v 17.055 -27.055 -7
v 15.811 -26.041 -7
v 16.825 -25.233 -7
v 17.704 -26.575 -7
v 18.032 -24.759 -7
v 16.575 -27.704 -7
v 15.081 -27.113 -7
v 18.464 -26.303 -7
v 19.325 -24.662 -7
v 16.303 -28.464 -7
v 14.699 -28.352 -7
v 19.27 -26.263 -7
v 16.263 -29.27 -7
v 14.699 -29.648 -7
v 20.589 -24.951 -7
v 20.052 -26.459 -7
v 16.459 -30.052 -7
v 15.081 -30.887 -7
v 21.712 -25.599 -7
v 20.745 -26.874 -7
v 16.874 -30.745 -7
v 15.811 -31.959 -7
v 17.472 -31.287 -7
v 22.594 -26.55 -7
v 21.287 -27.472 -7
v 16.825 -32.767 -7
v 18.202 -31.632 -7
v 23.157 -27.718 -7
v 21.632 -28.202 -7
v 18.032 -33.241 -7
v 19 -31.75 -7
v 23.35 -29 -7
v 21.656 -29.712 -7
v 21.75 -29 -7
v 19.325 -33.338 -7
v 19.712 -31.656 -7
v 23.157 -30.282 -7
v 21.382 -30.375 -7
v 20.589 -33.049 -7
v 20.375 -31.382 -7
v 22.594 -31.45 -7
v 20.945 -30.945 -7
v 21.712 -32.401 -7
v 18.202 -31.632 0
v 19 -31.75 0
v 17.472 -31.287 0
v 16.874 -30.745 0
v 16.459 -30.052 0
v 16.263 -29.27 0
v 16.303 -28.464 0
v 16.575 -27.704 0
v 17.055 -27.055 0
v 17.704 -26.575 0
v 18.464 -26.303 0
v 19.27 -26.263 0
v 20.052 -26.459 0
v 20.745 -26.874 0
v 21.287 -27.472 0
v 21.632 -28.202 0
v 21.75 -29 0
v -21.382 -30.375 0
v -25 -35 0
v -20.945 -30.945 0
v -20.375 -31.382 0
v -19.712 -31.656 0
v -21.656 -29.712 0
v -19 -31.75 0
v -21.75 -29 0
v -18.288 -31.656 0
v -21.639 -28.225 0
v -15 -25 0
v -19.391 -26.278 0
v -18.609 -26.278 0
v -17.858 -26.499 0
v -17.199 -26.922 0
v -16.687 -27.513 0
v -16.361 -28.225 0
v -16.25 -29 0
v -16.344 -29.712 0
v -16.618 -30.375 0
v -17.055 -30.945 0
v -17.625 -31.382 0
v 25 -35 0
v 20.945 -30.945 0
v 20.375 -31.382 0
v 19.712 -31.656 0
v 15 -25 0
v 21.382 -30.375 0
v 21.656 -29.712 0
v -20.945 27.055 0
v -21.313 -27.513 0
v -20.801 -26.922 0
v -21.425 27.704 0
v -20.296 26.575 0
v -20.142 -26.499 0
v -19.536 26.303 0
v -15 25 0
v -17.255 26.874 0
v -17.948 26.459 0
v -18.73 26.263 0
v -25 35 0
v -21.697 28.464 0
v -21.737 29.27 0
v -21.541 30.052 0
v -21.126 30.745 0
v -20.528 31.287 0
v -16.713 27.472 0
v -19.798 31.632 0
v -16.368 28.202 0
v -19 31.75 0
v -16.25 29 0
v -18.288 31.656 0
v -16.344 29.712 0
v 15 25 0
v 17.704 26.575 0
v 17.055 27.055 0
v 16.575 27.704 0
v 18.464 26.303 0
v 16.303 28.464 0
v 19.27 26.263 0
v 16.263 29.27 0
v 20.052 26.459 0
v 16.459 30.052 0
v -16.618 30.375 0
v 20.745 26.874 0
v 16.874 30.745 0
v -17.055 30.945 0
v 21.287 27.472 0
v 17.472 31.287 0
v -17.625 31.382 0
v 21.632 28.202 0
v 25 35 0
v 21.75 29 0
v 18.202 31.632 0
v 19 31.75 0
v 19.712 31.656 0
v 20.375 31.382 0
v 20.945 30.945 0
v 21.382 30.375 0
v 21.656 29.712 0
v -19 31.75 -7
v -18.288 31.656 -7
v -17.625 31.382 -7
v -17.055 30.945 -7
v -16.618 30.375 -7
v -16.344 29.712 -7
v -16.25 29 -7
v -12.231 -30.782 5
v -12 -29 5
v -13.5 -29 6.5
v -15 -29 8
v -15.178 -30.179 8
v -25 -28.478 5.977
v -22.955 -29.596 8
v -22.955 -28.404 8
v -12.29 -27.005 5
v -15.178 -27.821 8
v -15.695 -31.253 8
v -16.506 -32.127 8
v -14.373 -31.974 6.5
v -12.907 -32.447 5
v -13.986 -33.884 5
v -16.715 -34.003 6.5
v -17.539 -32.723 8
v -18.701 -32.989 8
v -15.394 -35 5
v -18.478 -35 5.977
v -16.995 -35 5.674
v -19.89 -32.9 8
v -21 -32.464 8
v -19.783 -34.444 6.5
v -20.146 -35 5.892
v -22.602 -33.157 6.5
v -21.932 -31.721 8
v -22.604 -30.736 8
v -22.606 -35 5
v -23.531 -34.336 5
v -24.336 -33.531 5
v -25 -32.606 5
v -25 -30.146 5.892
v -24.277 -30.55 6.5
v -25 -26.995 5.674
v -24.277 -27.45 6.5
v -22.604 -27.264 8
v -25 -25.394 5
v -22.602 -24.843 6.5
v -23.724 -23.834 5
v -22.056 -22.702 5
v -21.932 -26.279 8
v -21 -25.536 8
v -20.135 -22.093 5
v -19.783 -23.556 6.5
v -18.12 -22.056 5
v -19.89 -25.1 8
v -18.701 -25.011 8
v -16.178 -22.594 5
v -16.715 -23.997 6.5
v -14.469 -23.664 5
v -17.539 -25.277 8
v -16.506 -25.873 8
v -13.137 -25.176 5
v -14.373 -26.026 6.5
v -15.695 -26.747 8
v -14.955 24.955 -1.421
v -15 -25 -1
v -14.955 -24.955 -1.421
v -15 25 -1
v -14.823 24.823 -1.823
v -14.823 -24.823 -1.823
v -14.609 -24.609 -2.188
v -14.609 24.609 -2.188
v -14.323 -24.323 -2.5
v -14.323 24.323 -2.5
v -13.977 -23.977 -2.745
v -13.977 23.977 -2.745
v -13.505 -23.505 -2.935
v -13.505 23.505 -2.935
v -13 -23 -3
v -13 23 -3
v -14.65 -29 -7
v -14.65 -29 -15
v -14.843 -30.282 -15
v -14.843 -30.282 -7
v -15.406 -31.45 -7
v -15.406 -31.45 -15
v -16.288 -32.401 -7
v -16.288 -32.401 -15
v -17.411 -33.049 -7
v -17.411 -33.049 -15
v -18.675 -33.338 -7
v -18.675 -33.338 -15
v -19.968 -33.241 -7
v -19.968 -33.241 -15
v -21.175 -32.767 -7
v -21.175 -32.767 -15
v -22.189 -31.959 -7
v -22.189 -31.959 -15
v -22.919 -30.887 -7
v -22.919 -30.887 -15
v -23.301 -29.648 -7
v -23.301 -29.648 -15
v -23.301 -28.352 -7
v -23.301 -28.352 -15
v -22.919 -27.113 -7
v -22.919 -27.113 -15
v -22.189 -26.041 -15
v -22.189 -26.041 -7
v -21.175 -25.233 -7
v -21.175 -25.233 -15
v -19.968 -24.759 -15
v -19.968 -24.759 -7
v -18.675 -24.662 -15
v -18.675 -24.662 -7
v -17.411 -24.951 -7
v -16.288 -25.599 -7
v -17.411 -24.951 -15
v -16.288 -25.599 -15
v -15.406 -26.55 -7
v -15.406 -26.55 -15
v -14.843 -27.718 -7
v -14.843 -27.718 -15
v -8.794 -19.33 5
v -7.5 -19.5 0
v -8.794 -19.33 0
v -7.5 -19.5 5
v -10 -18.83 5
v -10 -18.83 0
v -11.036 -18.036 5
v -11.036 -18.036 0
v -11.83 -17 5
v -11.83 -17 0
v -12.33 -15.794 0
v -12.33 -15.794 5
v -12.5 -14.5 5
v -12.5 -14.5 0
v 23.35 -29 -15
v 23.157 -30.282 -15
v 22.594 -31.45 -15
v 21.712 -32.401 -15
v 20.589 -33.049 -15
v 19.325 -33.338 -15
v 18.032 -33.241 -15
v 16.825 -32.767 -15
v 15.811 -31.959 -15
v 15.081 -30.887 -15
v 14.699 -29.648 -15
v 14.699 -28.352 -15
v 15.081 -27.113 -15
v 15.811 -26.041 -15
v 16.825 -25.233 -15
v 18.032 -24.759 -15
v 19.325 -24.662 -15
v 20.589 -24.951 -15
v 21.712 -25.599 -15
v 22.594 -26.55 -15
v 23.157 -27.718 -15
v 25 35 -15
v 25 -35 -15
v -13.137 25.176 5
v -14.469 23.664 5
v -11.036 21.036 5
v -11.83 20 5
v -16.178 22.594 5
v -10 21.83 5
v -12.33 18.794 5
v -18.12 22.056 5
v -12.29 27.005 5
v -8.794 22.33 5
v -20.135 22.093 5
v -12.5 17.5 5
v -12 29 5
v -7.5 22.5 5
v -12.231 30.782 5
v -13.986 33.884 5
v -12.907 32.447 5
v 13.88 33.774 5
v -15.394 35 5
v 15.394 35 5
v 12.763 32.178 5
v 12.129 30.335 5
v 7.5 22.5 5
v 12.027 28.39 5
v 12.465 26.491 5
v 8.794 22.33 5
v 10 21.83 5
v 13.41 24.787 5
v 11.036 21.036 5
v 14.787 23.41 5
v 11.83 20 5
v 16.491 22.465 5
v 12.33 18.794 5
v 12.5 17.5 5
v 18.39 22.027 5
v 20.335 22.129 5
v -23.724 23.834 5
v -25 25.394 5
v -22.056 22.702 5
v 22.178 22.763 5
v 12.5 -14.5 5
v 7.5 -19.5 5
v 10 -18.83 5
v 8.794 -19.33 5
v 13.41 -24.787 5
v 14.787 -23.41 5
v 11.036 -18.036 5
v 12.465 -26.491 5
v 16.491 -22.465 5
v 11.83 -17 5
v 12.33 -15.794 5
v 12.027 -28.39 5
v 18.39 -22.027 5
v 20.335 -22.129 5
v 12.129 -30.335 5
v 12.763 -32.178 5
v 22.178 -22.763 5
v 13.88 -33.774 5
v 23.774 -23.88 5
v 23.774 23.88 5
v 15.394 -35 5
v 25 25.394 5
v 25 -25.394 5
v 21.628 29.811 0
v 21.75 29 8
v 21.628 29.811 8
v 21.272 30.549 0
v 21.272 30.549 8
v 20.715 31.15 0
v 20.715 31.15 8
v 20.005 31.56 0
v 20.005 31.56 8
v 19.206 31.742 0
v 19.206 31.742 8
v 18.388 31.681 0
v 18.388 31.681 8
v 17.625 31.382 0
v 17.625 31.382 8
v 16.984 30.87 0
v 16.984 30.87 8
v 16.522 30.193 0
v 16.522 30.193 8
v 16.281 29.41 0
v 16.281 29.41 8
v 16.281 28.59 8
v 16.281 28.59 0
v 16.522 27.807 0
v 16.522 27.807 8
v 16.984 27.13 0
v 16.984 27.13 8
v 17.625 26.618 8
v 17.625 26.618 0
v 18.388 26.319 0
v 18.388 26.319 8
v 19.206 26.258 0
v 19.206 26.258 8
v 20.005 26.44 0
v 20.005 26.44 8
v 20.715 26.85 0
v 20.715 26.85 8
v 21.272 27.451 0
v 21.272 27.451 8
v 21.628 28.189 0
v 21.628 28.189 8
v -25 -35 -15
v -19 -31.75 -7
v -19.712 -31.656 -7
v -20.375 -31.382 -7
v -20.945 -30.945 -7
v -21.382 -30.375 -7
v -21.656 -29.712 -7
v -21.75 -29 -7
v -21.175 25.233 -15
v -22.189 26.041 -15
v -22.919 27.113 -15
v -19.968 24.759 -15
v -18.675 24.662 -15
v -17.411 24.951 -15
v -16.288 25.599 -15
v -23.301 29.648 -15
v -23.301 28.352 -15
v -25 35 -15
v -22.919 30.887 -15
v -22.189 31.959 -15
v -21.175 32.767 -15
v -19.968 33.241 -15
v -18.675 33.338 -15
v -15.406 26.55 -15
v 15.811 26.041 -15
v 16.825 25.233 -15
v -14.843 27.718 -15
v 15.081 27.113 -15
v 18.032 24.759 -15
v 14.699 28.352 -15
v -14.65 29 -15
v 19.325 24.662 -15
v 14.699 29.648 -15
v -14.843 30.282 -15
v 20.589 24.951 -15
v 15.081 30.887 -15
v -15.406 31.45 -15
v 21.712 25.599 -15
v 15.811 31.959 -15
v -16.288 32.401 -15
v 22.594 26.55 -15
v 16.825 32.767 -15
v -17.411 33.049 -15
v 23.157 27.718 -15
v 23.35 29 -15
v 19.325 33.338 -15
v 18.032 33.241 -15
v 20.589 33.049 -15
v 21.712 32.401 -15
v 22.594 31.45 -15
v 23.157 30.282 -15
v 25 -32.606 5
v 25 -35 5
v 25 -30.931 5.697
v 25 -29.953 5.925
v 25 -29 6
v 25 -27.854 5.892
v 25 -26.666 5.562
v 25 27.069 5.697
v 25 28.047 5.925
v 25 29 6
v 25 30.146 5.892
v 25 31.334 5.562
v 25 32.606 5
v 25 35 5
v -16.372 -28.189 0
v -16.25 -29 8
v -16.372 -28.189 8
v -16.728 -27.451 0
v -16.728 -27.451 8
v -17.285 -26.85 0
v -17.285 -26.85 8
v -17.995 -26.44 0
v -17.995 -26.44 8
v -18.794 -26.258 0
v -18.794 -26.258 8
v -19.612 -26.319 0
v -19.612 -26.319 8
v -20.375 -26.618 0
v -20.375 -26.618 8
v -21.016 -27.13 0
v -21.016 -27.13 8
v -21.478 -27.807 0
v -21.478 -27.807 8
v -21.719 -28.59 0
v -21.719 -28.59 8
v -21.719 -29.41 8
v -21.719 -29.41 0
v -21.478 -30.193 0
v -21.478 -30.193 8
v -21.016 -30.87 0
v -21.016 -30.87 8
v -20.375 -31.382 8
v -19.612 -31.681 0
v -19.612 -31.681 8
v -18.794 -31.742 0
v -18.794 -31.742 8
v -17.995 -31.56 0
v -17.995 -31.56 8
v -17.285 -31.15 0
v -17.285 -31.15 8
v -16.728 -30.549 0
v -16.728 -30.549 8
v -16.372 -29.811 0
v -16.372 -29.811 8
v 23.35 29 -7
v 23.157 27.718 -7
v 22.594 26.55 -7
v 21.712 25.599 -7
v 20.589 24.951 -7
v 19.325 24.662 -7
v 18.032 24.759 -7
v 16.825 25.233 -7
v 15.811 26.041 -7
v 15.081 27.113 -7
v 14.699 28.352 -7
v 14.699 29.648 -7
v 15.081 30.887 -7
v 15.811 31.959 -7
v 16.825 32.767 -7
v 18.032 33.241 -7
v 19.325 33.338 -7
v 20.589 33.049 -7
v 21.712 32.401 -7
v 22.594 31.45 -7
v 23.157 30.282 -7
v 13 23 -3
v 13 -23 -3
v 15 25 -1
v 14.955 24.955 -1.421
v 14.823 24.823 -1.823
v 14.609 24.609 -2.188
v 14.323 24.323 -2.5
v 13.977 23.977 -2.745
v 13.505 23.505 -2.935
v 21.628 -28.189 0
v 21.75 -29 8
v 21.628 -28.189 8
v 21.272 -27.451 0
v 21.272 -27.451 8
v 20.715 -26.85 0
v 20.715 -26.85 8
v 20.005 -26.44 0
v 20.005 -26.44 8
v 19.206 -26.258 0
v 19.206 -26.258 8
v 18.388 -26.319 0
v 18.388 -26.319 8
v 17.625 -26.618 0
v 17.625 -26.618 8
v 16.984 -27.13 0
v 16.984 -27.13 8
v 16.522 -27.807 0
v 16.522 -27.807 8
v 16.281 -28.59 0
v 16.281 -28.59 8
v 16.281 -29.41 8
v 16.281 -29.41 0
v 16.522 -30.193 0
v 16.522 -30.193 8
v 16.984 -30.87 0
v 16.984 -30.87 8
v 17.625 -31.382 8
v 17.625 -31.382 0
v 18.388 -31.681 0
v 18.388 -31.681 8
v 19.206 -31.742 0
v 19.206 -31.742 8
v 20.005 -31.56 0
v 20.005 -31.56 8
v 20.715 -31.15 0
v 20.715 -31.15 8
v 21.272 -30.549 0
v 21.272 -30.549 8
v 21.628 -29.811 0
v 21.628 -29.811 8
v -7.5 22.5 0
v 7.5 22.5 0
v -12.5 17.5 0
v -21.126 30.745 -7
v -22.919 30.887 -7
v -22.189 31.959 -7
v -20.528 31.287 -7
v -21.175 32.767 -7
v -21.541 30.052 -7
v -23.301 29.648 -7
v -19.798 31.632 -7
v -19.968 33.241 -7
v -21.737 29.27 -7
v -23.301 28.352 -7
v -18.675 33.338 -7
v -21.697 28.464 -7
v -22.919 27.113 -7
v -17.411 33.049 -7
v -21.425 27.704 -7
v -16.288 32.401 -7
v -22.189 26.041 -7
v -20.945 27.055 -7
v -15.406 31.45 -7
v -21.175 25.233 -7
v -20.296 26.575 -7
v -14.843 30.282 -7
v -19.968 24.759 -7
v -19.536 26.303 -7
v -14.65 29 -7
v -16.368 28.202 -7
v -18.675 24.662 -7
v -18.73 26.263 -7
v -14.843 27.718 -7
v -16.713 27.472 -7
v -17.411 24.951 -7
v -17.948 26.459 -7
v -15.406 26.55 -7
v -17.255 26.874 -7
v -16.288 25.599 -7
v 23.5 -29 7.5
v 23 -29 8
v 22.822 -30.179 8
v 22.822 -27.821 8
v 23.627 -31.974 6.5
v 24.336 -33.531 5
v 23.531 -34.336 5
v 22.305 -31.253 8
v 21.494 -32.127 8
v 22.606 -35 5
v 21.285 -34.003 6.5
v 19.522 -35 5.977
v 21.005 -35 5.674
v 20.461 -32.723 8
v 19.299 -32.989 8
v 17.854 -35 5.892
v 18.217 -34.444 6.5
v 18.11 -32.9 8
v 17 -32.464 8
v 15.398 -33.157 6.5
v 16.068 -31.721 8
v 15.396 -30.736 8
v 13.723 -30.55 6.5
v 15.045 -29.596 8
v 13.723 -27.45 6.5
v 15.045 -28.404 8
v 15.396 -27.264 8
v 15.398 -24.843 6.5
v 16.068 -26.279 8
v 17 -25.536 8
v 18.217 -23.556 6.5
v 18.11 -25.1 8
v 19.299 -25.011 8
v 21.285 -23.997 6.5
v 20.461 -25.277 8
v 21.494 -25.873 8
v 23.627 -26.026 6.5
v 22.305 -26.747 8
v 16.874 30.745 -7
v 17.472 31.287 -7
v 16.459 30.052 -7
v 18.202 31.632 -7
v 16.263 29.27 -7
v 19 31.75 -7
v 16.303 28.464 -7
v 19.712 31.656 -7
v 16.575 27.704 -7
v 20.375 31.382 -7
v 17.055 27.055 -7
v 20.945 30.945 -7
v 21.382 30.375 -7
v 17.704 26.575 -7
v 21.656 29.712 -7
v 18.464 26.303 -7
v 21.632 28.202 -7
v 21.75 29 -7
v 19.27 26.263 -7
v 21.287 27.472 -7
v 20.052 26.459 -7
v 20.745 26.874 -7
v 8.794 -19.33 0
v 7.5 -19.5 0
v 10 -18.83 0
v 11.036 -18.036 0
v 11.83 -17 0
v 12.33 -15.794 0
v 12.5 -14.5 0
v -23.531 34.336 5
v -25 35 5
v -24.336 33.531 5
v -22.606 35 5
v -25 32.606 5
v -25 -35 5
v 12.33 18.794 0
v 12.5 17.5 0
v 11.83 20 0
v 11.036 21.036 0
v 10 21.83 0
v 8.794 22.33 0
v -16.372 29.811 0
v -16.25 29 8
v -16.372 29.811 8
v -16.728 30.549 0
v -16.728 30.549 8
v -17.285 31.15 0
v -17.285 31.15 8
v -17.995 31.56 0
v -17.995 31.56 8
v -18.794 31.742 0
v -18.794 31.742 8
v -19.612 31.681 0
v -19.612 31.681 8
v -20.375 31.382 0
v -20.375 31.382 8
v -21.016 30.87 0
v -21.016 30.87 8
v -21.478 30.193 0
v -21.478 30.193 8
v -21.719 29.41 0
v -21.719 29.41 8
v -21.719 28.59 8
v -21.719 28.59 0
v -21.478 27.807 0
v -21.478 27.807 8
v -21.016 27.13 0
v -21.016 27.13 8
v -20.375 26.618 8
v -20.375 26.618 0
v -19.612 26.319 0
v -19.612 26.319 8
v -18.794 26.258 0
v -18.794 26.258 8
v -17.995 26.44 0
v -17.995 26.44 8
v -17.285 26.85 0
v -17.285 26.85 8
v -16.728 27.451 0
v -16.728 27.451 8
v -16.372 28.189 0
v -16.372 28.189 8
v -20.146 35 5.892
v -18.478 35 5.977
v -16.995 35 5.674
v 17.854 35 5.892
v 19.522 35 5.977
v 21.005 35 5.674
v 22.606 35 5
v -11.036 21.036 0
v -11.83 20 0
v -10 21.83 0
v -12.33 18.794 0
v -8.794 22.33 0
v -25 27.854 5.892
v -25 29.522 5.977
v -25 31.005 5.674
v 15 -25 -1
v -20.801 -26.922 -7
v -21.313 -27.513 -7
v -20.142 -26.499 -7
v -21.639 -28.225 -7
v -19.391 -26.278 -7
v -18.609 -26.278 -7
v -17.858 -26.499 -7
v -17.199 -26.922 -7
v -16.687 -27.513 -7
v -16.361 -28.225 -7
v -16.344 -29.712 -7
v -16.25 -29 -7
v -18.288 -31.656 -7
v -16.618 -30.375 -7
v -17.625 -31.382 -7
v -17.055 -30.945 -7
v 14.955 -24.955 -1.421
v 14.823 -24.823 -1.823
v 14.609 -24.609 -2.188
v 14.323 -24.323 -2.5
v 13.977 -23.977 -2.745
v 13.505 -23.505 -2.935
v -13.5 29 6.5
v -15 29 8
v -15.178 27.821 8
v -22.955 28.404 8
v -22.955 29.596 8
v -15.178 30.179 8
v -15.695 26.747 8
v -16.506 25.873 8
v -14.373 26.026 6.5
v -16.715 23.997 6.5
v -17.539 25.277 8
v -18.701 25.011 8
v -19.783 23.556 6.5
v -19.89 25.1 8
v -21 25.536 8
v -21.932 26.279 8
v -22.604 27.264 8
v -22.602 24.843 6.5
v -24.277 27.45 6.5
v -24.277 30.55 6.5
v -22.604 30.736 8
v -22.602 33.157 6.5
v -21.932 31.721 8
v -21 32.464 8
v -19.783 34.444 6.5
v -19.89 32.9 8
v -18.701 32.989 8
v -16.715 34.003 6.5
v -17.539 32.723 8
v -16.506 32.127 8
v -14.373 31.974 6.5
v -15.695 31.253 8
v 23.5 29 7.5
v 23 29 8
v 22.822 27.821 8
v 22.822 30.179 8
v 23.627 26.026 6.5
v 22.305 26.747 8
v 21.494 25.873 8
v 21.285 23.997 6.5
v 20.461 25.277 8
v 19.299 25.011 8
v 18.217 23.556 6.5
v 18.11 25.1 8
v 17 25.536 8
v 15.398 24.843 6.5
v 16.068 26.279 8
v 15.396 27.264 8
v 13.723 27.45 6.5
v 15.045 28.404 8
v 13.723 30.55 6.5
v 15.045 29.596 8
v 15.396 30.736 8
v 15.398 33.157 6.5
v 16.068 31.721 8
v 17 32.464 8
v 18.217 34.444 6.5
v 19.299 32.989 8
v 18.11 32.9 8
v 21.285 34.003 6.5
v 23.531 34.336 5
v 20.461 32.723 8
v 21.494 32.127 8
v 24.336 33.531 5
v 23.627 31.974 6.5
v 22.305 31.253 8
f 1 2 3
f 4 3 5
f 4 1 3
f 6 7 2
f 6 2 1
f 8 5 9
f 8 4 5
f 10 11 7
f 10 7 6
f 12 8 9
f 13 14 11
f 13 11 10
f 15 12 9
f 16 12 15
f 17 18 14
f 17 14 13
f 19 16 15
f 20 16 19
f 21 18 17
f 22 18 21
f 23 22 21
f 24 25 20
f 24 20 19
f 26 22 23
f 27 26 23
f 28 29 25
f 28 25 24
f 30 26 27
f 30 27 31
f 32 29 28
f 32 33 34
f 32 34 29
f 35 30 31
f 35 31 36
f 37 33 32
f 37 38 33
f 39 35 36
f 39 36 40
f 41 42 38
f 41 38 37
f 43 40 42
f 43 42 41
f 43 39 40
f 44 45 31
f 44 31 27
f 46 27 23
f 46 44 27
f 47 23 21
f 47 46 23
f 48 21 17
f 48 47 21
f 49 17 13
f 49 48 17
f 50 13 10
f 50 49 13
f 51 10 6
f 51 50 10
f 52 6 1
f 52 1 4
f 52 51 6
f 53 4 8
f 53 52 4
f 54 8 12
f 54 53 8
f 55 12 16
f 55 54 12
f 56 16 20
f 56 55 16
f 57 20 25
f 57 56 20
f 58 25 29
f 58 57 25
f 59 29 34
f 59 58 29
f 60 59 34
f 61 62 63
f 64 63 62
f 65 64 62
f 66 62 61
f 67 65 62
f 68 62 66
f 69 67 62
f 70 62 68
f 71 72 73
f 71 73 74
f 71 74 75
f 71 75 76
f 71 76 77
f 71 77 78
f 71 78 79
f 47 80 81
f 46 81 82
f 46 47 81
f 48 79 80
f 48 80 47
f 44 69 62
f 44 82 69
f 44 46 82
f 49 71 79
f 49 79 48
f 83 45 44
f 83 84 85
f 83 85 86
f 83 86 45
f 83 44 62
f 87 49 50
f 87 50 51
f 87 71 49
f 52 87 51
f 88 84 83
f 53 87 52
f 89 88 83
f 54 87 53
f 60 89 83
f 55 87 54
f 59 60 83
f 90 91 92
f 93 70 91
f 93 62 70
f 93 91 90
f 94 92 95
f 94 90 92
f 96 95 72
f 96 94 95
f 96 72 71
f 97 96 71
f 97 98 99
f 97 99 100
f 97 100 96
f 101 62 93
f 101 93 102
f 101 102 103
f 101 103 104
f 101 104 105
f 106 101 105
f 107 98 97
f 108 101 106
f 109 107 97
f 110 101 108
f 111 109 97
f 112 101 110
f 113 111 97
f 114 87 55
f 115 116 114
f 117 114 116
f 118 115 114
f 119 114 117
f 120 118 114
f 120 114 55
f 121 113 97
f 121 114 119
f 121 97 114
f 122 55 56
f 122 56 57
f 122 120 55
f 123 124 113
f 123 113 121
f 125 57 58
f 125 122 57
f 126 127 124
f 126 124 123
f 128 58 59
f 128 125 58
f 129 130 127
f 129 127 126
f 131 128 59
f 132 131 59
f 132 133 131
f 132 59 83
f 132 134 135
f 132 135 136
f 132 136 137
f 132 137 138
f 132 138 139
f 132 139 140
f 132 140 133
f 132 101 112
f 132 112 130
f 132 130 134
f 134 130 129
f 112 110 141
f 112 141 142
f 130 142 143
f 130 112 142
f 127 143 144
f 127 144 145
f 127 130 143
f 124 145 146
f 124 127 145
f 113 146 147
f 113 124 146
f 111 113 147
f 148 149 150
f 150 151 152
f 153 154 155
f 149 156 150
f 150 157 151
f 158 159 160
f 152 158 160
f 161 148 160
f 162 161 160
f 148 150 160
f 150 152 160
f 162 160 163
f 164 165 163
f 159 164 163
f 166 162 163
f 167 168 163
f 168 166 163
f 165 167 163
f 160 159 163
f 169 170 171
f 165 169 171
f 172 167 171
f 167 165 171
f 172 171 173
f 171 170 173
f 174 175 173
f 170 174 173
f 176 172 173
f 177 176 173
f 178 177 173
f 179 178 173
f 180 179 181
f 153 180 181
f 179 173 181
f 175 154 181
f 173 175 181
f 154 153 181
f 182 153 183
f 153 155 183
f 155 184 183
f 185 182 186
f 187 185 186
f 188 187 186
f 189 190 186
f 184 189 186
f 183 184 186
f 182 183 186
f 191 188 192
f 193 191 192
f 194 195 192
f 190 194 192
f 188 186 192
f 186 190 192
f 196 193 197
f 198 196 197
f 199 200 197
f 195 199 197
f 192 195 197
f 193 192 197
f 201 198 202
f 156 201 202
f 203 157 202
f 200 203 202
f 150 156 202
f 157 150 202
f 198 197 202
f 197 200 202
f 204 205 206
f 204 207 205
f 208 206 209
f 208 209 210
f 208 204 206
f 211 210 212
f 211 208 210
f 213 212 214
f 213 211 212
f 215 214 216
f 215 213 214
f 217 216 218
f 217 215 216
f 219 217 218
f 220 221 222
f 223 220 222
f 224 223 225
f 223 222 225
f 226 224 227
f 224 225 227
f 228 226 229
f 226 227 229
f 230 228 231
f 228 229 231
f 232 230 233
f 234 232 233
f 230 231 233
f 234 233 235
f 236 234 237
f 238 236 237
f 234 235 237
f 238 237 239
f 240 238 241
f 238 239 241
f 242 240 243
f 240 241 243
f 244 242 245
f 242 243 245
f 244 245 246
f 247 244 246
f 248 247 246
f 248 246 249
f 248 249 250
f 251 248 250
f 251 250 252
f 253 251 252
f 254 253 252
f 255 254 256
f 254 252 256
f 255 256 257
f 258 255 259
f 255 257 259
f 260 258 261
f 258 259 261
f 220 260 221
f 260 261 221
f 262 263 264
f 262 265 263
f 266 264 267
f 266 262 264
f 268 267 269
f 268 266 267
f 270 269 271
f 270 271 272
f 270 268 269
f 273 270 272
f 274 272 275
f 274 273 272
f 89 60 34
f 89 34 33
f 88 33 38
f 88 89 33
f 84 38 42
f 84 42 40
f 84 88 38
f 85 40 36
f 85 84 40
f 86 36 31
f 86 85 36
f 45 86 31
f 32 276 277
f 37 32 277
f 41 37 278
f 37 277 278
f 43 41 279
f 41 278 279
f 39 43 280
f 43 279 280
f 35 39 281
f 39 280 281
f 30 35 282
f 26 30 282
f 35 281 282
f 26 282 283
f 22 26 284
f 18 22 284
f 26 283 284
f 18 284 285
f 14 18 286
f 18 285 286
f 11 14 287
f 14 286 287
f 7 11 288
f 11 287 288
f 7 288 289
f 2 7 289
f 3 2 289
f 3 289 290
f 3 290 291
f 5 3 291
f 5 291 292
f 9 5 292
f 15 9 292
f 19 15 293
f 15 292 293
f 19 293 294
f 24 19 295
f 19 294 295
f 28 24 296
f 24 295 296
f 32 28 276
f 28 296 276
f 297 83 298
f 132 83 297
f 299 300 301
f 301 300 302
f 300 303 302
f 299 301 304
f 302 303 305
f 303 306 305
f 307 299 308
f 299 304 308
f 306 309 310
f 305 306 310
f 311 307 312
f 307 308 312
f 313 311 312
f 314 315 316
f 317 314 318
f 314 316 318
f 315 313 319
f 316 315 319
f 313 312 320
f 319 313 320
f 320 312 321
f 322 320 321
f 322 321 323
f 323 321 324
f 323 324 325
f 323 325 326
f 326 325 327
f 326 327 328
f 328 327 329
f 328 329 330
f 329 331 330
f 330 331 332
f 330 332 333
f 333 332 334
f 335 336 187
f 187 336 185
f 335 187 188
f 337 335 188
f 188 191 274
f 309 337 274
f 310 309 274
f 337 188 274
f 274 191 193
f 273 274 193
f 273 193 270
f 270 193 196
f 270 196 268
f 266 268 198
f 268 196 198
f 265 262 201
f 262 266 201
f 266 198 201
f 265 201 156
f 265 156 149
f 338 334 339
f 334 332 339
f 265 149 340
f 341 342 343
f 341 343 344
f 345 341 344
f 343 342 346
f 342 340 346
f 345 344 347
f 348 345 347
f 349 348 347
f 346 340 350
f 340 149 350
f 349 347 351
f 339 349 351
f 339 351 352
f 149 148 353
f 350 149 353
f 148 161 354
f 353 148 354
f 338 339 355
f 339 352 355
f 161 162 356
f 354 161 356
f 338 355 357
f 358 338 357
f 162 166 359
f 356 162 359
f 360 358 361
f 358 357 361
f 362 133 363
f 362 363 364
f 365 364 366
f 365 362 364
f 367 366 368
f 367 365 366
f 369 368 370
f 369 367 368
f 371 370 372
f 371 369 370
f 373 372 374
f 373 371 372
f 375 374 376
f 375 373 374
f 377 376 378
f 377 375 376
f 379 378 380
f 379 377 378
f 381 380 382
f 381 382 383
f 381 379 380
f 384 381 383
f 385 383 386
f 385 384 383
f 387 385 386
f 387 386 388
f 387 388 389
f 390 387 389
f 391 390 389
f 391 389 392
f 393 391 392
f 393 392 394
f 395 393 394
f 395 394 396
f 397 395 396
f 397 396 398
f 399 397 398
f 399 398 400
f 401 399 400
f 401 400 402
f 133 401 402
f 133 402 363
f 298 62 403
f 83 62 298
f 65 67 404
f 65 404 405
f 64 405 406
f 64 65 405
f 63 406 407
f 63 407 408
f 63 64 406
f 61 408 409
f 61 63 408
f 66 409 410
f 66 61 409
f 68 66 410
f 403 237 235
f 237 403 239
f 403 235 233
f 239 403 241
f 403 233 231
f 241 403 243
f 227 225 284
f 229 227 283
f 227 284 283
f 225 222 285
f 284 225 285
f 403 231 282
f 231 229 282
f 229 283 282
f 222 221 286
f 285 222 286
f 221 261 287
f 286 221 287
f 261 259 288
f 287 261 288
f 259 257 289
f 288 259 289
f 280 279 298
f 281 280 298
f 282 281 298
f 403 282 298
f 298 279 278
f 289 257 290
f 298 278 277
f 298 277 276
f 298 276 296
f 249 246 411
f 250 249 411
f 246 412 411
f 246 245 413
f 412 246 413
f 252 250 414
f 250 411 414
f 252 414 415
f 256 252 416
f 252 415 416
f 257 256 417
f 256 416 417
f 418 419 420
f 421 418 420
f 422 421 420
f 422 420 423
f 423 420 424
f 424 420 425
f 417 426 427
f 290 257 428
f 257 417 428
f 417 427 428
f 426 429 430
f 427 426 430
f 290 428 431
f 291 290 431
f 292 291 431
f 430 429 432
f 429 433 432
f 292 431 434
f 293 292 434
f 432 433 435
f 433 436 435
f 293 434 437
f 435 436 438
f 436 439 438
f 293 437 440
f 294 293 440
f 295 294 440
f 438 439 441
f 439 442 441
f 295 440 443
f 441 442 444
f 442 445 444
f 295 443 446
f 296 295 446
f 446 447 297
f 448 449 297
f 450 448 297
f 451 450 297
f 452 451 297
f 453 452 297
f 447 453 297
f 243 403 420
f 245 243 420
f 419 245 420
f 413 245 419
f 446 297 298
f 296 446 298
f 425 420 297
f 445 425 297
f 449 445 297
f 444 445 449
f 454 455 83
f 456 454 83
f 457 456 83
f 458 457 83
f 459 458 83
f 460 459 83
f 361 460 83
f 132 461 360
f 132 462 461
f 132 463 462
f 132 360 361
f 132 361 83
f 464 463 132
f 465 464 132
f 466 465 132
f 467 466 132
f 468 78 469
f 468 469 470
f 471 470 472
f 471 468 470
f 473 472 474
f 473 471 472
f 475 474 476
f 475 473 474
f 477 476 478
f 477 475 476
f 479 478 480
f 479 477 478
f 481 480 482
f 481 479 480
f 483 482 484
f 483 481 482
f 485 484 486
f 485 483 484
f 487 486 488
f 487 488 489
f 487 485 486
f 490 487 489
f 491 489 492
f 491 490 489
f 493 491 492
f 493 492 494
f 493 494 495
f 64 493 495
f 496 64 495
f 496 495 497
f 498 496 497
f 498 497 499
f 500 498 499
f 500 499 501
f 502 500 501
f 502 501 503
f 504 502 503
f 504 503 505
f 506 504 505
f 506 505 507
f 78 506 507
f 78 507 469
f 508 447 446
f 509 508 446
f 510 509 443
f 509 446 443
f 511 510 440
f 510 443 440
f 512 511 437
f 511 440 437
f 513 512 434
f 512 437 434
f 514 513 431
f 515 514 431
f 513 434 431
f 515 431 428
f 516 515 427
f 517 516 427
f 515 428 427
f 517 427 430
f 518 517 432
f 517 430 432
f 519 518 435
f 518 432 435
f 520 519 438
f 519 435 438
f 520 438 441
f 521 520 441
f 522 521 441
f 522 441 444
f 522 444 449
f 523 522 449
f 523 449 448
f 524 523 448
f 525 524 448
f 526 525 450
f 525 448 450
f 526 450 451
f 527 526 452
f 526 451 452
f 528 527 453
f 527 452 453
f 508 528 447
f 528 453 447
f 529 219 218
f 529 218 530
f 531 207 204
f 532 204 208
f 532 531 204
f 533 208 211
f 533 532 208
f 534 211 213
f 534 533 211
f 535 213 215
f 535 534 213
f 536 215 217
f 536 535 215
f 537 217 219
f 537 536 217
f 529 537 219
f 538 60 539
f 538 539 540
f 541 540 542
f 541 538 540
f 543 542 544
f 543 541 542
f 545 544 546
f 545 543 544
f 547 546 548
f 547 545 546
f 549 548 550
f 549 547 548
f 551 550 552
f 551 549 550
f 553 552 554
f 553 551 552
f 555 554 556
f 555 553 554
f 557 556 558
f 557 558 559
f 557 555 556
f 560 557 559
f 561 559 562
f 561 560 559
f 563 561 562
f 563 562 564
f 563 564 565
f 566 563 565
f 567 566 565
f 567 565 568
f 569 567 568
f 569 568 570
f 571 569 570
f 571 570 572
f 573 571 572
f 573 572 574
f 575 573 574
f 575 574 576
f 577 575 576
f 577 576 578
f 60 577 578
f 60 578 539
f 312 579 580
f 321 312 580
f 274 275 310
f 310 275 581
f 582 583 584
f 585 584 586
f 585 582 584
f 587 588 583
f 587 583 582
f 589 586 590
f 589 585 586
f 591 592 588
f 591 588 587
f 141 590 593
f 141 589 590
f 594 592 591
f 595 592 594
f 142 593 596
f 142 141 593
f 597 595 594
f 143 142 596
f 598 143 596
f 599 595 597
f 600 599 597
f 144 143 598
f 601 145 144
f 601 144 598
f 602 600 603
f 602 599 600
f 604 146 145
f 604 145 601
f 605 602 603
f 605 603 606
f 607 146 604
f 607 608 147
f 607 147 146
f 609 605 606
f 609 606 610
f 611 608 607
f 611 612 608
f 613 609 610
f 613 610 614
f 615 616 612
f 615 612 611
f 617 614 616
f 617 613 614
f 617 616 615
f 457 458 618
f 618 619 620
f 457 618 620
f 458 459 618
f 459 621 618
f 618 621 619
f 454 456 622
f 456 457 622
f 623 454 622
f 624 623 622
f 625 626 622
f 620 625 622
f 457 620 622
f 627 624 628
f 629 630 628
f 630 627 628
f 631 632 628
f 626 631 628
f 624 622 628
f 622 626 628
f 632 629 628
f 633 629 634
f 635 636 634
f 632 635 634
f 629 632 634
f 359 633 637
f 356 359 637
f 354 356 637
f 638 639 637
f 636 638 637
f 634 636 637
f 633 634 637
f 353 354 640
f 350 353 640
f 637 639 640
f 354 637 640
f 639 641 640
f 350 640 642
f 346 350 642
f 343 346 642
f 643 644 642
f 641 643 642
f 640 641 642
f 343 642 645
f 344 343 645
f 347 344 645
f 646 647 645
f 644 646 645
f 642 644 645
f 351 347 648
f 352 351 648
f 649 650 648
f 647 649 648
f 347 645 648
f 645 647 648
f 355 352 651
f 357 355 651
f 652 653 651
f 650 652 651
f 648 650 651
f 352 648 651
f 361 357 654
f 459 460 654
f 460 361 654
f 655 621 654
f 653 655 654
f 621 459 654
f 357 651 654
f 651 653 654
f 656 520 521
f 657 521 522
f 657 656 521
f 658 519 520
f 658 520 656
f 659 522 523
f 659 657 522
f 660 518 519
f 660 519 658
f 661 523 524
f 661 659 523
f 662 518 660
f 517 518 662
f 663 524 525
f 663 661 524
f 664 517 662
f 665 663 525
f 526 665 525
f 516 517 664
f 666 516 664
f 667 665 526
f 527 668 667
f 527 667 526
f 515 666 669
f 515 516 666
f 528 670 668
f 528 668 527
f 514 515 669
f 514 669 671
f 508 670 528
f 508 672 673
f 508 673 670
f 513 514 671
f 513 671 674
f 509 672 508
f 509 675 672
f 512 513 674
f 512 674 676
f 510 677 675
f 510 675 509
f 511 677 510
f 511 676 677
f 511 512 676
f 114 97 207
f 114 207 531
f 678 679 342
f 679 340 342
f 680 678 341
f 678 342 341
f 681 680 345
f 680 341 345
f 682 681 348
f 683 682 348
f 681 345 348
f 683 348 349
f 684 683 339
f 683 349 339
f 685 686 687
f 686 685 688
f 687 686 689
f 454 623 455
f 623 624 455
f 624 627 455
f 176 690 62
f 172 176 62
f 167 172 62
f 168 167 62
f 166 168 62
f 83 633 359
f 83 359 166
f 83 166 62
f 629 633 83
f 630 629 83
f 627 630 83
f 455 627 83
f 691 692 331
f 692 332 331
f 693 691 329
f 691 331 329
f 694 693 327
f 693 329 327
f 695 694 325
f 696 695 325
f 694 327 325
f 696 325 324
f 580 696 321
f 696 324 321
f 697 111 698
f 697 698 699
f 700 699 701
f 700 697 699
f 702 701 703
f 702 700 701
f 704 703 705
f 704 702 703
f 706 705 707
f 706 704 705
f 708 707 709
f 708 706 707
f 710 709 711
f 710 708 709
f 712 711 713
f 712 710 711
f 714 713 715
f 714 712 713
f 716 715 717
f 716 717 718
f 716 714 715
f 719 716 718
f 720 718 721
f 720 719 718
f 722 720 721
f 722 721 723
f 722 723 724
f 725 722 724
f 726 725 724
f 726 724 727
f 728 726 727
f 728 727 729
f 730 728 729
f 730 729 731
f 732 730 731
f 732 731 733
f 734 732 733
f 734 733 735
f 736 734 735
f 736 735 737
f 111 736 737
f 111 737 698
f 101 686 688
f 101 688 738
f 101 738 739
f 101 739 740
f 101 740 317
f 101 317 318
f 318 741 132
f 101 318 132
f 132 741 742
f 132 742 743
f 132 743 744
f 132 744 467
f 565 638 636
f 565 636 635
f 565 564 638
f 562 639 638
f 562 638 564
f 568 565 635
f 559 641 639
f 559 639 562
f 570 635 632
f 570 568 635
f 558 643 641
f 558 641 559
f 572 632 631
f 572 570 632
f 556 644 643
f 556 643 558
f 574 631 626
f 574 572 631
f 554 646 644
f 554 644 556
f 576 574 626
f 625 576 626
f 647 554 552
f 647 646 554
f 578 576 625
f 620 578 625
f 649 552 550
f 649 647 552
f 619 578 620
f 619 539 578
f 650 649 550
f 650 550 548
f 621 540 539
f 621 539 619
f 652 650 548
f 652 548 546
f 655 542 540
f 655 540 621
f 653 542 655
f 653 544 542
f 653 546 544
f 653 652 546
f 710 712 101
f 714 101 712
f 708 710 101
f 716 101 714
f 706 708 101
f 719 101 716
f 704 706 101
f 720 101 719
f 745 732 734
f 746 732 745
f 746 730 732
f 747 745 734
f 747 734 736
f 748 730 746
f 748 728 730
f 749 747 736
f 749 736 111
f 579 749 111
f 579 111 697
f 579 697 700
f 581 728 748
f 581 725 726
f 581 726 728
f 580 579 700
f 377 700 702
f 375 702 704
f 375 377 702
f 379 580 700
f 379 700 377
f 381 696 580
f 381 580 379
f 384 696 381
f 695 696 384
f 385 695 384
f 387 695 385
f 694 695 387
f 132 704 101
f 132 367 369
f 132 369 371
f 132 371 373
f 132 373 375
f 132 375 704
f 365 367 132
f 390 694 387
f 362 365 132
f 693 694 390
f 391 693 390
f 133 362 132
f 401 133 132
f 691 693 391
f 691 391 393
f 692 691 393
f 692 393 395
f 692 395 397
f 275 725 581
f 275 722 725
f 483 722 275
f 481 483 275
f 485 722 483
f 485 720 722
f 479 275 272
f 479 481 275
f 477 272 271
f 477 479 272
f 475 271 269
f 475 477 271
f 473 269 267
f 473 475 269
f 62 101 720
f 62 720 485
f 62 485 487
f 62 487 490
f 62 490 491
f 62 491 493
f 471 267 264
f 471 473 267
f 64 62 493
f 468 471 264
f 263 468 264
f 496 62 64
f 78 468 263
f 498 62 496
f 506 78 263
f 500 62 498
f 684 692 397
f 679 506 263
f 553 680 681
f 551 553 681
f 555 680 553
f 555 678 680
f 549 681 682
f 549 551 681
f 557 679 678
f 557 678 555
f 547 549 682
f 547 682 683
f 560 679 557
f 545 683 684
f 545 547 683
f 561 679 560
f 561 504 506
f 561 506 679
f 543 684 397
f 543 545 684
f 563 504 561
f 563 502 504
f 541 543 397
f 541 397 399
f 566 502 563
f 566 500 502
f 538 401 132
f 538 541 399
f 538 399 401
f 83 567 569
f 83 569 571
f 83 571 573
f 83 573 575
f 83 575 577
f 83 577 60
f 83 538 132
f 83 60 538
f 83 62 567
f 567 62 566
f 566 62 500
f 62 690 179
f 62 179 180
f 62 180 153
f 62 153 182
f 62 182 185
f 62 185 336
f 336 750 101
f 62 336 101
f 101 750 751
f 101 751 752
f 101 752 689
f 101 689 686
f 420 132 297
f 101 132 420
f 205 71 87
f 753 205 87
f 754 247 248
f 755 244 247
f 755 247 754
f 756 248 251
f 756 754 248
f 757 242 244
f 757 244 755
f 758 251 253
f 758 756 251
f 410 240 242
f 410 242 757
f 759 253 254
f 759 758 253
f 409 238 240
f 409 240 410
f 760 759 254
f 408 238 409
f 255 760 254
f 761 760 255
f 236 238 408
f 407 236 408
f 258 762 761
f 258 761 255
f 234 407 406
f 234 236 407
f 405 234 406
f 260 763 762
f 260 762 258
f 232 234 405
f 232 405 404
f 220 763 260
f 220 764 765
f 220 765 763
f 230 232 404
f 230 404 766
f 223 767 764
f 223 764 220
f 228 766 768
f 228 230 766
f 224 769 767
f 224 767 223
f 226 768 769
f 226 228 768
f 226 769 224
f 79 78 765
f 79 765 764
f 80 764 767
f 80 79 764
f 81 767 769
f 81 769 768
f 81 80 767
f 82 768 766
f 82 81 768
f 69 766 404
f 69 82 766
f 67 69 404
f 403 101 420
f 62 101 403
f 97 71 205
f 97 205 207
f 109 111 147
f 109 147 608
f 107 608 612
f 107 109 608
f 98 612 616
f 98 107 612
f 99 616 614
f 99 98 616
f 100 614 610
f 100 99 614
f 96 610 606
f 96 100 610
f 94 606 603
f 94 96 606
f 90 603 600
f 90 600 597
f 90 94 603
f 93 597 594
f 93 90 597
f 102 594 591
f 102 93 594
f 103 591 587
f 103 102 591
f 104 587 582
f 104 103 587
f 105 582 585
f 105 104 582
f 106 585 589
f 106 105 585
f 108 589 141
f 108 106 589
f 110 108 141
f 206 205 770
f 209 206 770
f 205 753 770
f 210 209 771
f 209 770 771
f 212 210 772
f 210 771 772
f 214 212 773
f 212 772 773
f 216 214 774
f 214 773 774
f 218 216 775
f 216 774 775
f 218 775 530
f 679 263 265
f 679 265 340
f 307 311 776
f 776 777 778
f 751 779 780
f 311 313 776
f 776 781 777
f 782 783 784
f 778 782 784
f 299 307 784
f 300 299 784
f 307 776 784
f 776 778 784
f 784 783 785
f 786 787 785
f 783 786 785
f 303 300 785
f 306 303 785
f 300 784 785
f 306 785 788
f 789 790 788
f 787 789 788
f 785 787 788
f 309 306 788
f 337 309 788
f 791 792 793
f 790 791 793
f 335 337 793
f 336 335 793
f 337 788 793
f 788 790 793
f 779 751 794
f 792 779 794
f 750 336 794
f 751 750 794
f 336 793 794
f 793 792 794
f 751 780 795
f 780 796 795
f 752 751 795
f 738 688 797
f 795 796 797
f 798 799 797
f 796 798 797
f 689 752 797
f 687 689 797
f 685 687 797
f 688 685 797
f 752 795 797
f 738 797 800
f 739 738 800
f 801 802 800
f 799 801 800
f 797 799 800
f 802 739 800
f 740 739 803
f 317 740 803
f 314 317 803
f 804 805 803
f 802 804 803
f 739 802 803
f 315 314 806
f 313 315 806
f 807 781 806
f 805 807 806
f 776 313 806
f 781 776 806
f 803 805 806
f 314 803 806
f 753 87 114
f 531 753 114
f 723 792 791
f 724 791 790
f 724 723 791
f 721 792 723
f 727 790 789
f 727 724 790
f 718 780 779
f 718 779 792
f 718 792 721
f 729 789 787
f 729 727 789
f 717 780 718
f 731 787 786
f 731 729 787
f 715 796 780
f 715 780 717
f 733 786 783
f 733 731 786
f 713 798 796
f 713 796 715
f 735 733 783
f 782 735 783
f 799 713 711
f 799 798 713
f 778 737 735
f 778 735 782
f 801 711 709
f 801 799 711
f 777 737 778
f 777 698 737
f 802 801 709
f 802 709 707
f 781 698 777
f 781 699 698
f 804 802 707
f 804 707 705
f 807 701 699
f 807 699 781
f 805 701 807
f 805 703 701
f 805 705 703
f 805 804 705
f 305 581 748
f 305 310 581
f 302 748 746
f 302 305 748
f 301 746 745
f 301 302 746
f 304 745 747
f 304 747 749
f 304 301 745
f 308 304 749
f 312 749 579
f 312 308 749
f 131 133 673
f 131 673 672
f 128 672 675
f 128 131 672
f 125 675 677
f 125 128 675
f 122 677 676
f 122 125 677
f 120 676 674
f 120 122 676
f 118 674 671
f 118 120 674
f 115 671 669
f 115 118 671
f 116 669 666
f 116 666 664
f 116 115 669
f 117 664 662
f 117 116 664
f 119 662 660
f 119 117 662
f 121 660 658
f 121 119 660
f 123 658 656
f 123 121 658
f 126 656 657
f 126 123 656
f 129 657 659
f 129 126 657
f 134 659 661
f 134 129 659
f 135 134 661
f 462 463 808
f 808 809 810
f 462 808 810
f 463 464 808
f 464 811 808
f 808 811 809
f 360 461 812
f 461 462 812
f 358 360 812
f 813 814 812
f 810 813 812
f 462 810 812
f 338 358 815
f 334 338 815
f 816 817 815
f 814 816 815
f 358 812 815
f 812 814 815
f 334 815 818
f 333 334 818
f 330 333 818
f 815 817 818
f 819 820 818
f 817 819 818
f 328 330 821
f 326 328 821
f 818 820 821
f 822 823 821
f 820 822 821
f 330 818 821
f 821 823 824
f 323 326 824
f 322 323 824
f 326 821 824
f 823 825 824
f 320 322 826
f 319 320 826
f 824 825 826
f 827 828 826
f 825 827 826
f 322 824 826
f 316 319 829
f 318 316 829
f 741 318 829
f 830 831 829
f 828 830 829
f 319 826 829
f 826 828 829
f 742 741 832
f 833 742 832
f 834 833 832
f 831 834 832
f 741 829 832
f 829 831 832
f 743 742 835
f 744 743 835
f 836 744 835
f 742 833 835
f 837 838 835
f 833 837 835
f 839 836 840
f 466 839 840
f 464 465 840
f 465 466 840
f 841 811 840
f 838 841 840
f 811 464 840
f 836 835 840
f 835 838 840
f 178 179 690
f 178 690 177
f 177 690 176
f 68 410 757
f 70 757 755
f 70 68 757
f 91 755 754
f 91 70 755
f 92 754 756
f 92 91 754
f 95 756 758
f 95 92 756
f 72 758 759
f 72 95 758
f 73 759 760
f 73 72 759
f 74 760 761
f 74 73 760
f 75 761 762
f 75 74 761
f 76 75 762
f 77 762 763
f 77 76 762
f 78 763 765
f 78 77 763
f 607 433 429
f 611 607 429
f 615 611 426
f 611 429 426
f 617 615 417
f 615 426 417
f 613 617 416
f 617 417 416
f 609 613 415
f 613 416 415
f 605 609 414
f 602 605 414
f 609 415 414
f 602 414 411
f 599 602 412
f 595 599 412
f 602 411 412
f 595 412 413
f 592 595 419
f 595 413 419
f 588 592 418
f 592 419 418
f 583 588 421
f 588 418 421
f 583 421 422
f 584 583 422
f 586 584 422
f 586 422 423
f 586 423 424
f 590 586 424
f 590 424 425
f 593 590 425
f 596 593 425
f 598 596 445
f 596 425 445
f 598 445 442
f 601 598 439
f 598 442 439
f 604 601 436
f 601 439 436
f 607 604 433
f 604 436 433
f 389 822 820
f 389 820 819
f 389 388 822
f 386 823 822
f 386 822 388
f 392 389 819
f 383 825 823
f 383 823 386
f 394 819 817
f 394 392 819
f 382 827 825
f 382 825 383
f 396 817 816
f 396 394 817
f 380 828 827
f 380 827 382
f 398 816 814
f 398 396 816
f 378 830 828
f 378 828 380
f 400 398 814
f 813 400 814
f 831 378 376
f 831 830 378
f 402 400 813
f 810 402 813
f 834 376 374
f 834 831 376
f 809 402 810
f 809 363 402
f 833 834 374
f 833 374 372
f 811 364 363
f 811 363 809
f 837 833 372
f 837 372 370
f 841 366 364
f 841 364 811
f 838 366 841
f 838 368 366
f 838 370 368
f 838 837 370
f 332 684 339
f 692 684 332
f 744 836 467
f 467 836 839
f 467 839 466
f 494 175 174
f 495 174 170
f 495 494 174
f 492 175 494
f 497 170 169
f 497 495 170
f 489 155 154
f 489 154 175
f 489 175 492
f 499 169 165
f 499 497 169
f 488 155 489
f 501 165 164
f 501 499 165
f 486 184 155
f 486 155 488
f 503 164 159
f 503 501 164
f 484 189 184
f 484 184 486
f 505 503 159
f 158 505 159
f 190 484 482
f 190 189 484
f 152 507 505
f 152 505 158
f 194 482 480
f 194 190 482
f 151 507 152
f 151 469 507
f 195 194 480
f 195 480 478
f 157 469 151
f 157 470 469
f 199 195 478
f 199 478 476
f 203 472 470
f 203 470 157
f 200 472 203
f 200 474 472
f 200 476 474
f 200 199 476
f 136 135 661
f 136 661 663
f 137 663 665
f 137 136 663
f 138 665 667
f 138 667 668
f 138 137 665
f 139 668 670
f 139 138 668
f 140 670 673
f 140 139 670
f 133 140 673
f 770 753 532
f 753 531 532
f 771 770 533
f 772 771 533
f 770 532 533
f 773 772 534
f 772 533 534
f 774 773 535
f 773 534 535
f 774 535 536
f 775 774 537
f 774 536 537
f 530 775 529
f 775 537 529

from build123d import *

# Parameters (mm, degrees)
F0_W     = 30
F0_H     = 50
F1_DEPTH = 15
F2_R     = 4.35
F2_R_2   = 2.75
F3_DEPTH = 8
F4_DEPTH = 3
F5_R     = 2
F6_W     = 50
F6_H     = 70
F6_R     = 4
F6_W_2   = 30
F6_H_2   = 50
F6_W_3   = 25
F6_H_3   = 45
F6_R_2   = 2.75
F7_DEPTH = 5
F8_DEPTH = 8
F9_DEPTH = 3
F11_R    = 5


# Not quite as in the source:
# - a fillet or chamfer that OpenCascade refuses, or shapes differently, is made with other operations: its cross-section is extruded or revolved along the edge and cut away or added


with BuildPart() as f1:
    # F0 (on Top) → F1 (new body)
    with BuildSketch(Plane.XY):
        with BuildLine():
            Line((19, 31.75), (19, 35))
            Line((19, 35), (-19, 35))
            Line((-19, 35), (-25, 35))
            Line((-25, 35), (-25, -29))
            Line((-25, -29), (-21.75, -29))
            ThreePointArc((-21.75, -29), (-19, -26.25), (-16.25, -29))
            ThreePointArc((-16.25, -29), (-17.0554563517, -30.9445436483), (-19, -31.75))
            Line((-19, -31.75), (-19, -35))
            Line((-19, -35), (19, -35))
            Line((19, -35), (19, -31.75))
            ThreePointArc((19, -31.75), (17.0554563517, -27.0554563517), (21.75, -29))
            Line((21.75, -29), (25, -29))
            Line((25, -29), (25, 29))
            Line((25, 29), (21.75, 29))
            ThreePointArc((21.75, 29), (17.0554563517, 27.0554563517), (19, 31.75))
        make_face()
        with BuildLine():
            ThreePointArc((-16.25, 29), (-20.9445436483, 27.0554563517), (-19, 31.75))
            ThreePointArc((-19, 31.75), (-17.0554563517, 30.9445436483), (-16.25, 29))
        make_face(mode=Mode.SUBTRACT)
        Rectangle(F0_W, F0_H, mode=Mode.SUBTRACT)
        with BuildLine():
            Line((25, 29), (25, 35))
            Line((25, 35), (19, 35))
            Line((19, 35), (19, 31.75))
            ThreePointArc((19, 31.75), (20.9445436483, 30.9445436483), (21.75, 29))
            Line((21.75, 29), (25, 29))
        make_face()
        with BuildLine():
            Line((25, -35), (25, -29))
            Line((25, -29), (21.75, -29))
            ThreePointArc((21.75, -29), (20.9445436483, -30.9445436483), (19, -31.75))
            Line((19, -31.75), (19, -35))
            Line((19, -35), (25, -35))
        make_face()
        with BuildLine():
            Line((-21.75, -29), (-25, -29))
            Line((-25, -29), (-25, -35))
            Line((-25, -35), (-19, -35))
            Line((-19, -35), (-19, -31.75))
            ThreePointArc((-19, -31.75), (-20.9445436483, -30.9445436483), (-21.75, -29))
        make_face()
        Rectangle(F0_W, F0_H)
    extrude(amount=-F1_DEPTH)

    # F2 (on face) → F3 (cut)
    with BuildSketch(Plane(origin=(0, 0, -15), x_dir=(1, 0, 0), z_dir=(0, 0, -1))):
        with Locations((-19, 29)):
            Circle(F2_R)
        with Locations((-19, 29)):
            Circle(F2_R_2, mode=Mode.SUBTRACT)
        with Locations((19, 29)):
            Circle(F2_R)
        with Locations((19, 29)):
            Circle(F2_R_2, mode=Mode.SUBTRACT)
        with Locations((19, -29)):
            Circle(F2_R)
        with Locations((19, -29)):
            Circle(F2_R_2, mode=Mode.SUBTRACT)
        with Locations((-19, -29)):
            Circle(F2_R)
        with Locations((-19, -29)):
            Circle(F2_R_2, mode=Mode.SUBTRACT)
    extrude(amount=-F3_DEPTH, mode=Mode.SUBTRACT)

    # F0 (on Top) → F4 (cut)
    with BuildSketch(Plane.XY):
        Rectangle(F0_W, F0_H)
    extrude(amount=-F4_DEPTH, mode=Mode.SUBTRACT)

    # F5
    f5_edges = [f1.edges().sort_by_distance(p)[0] for p in [
        (0, 25, -3),
        (15, 0, -3),
        (-15, 0, -3),
        (0, -25, -3),
    ]]
    fillet(f5_edges, radius=F5_R)


with BuildPart() as f7:
    # F6 (on face) → F7 (new body)
    with BuildSketch(Plane.XY):
        Rectangle(F6_W, F6_H)
        with Locations((-19, -29)):
            Circle(F6_R, mode=Mode.SUBTRACT)
        with Locations((19, -29)):
            Circle(F6_R, mode=Mode.SUBTRACT)
        with Locations((-19, 29)):
            Circle(F6_R, mode=Mode.SUBTRACT)
        Rectangle(F6_W_2, F6_H_2, mode=Mode.SUBTRACT)
        with Locations((19, 29)):
            Circle(F6_R, mode=Mode.SUBTRACT)
        Rectangle(F6_W_2, F6_H_2)
        Rectangle(F6_W_3, F6_H_3, mode=Mode.SUBTRACT)
        with Locations((19, -29)):
            Circle(F6_R)
        with Locations((19, -29)):
            Circle(F6_R_2, mode=Mode.SUBTRACT)
        with Locations((-19, -29)):
            Circle(F6_R)
        with Locations((-19, -29)):
            Circle(F6_R_2, mode=Mode.SUBTRACT)
        with Locations((19, 29)):
            Circle(F6_R)
        with Locations((19, 29)):
            Circle(F6_R_2, mode=Mode.SUBTRACT)
        with Locations((-19, 29)):
            Circle(F6_R)
        with Locations((-19, 29)):
            Circle(F6_R_2, mode=Mode.SUBTRACT)
    extrude(amount=F7_DEPTH)

    # F6 (on face) → F8 (join)
    with BuildSketch(Plane.XY):
        with Locations((19, 29)):
            Circle(F6_R)
        with Locations((19, 29)):
            Circle(F6_R_2, mode=Mode.SUBTRACT)
        with Locations((-19, 29)):
            Circle(F6_R)
        with Locations((-19, 29)):
            Circle(F6_R_2, mode=Mode.SUBTRACT)
        with Locations((-19, -29)):
            Circle(F6_R)
        with Locations((-19, -29)):
            Circle(F6_R_2, mode=Mode.SUBTRACT)
        with Locations((19, -29)):
            Circle(F6_R)
        with Locations((19, -29)):
            Circle(F6_R_2, mode=Mode.SUBTRACT)
    extrude(amount=F8_DEPTH)

    # F9 (add): a face of the model
    f9_faces = [f7.faces().sort_by_distance(p)[0] for p in [
        (0, -22.5, 2.5),
    ]]
    extrude(f9_faces, amount=F9_DEPTH)

    # F10: chamfer of 3 on 4 edges, made by hand


with BuildPart() as f10_tool2:
    # F10_s3 → F10_t4 (revolve)
    with BuildSketch(Plane.XZ.offset(-29)):
        Polygon((26, 5), (23, 8), (23, 5), align=None)
    revolve(axis=Axis((19, 29, 5), (0, 0, -1)))

    split(bisect_by=Plane.YZ.offset(25), keep=Keep.BOTTOM)

    split(bisect_by=Plane.XZ.offset(-35), keep=Keep.TOP)

    split(bisect_by=Plane.XY.offset(8), keep=Keep.BOTTOM)


with BuildPart() as f7_1:
    add(f7.part)

    # F10_t1: union F10_tool2
    add(f10_tool2.part)


with BuildPart() as f10_tool9:
    # F10_s10 → F10_t11 (revolve)
    with BuildSketch(Plane.XZ.offset(29)):
        Polygon((26, 5), (23, 8), (23, 5), align=None)
    revolve(axis=Axis((19, -29, 5), (0, 0, -1)))

    split(bisect_by=Plane.YZ.offset(25), keep=Keep.BOTTOM)

    split(bisect_by=Plane.XZ.offset(35), keep=Keep.BOTTOM)

    split(bisect_by=Plane.XY.offset(8), keep=Keep.BOTTOM)


with BuildPart() as f7_2:
    add(f7_1.part)

    # F10_t8: union F10_tool9
    add(f10_tool9.part)


with BuildPart() as f10_tool16:
    # F10_s17 → F10_t18 (revolve)
    with BuildSketch(Plane.XZ.offset(29)):
        Polygon((-12, 5), (-15, 8), (-15, 5), align=None)
    revolve(axis=Axis((-19, -29, 5), (0, 0, -1)))

    split(bisect_by=Plane.XZ.offset(35), keep=Keep.BOTTOM)

    split(bisect_by=Plane.YZ.offset(-25), keep=Keep.TOP)

    split(bisect_by=Plane.XY.offset(8), keep=Keep.BOTTOM)


with BuildPart() as f7_3:
    add(f7_2.part)

    # F10_t15: union F10_tool16
    add(f10_tool16.part)


with BuildPart() as f10_tool23:
    # F10_s24 → F10_t25 (revolve)
    with BuildSketch(Plane.XZ.offset(-29)):
        Polygon((-12, 5), (-15, 8), (-15, 5), align=None)
    revolve(axis=Axis((-19, 29, 5), (0, 0, -1)))

    split(bisect_by=Plane.XZ.offset(-35), keep=Keep.TOP)

    split(bisect_by=Plane.YZ.offset(-25), keep=Keep.TOP)

    split(bisect_by=Plane.XY.offset(8), keep=Keep.BOTTOM)


with BuildPart() as f7_4:
    add(f7_3.part)

    # F10_t22: union F10_tool23
    add(f10_tool23.part)

    # F11
    f11_edges = [f7_4.edges().sort_by_distance(p)[0] for p in [
        (-12.5, -19.5, 2.5),
        (12.5, -19.5, 2.5),
        (-12.5, 22.5, 2.5),
        (12.5, 22.5, 2.5),
    ]]
    fillet(f11_edges, radius=F11_R)


solid = Compound([f1.part, f7_4.part])
